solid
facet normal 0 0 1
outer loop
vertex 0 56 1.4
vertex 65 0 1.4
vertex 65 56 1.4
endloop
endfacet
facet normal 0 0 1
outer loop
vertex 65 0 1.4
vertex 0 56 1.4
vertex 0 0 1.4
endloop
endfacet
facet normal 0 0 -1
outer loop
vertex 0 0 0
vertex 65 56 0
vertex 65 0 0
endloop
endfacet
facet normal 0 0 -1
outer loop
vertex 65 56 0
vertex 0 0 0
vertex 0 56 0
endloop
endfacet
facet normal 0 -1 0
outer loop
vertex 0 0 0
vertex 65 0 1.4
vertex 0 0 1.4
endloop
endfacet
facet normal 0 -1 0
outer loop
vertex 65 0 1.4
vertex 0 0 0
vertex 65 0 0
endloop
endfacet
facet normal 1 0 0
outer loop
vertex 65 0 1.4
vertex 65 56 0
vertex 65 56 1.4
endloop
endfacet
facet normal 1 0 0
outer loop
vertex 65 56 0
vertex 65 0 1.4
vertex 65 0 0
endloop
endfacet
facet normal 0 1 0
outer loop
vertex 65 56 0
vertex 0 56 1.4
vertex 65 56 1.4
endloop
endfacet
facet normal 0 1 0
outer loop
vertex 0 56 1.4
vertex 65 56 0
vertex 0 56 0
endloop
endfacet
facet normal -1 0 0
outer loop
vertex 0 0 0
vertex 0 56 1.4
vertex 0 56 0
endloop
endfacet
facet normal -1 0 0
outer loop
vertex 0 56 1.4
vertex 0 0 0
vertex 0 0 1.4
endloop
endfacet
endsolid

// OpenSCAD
$fn = 64;

board_x = 65.0;
board_y = 56.0;
board_th = 1.4;

cube([board_x, board_y, board_th], center=false);
